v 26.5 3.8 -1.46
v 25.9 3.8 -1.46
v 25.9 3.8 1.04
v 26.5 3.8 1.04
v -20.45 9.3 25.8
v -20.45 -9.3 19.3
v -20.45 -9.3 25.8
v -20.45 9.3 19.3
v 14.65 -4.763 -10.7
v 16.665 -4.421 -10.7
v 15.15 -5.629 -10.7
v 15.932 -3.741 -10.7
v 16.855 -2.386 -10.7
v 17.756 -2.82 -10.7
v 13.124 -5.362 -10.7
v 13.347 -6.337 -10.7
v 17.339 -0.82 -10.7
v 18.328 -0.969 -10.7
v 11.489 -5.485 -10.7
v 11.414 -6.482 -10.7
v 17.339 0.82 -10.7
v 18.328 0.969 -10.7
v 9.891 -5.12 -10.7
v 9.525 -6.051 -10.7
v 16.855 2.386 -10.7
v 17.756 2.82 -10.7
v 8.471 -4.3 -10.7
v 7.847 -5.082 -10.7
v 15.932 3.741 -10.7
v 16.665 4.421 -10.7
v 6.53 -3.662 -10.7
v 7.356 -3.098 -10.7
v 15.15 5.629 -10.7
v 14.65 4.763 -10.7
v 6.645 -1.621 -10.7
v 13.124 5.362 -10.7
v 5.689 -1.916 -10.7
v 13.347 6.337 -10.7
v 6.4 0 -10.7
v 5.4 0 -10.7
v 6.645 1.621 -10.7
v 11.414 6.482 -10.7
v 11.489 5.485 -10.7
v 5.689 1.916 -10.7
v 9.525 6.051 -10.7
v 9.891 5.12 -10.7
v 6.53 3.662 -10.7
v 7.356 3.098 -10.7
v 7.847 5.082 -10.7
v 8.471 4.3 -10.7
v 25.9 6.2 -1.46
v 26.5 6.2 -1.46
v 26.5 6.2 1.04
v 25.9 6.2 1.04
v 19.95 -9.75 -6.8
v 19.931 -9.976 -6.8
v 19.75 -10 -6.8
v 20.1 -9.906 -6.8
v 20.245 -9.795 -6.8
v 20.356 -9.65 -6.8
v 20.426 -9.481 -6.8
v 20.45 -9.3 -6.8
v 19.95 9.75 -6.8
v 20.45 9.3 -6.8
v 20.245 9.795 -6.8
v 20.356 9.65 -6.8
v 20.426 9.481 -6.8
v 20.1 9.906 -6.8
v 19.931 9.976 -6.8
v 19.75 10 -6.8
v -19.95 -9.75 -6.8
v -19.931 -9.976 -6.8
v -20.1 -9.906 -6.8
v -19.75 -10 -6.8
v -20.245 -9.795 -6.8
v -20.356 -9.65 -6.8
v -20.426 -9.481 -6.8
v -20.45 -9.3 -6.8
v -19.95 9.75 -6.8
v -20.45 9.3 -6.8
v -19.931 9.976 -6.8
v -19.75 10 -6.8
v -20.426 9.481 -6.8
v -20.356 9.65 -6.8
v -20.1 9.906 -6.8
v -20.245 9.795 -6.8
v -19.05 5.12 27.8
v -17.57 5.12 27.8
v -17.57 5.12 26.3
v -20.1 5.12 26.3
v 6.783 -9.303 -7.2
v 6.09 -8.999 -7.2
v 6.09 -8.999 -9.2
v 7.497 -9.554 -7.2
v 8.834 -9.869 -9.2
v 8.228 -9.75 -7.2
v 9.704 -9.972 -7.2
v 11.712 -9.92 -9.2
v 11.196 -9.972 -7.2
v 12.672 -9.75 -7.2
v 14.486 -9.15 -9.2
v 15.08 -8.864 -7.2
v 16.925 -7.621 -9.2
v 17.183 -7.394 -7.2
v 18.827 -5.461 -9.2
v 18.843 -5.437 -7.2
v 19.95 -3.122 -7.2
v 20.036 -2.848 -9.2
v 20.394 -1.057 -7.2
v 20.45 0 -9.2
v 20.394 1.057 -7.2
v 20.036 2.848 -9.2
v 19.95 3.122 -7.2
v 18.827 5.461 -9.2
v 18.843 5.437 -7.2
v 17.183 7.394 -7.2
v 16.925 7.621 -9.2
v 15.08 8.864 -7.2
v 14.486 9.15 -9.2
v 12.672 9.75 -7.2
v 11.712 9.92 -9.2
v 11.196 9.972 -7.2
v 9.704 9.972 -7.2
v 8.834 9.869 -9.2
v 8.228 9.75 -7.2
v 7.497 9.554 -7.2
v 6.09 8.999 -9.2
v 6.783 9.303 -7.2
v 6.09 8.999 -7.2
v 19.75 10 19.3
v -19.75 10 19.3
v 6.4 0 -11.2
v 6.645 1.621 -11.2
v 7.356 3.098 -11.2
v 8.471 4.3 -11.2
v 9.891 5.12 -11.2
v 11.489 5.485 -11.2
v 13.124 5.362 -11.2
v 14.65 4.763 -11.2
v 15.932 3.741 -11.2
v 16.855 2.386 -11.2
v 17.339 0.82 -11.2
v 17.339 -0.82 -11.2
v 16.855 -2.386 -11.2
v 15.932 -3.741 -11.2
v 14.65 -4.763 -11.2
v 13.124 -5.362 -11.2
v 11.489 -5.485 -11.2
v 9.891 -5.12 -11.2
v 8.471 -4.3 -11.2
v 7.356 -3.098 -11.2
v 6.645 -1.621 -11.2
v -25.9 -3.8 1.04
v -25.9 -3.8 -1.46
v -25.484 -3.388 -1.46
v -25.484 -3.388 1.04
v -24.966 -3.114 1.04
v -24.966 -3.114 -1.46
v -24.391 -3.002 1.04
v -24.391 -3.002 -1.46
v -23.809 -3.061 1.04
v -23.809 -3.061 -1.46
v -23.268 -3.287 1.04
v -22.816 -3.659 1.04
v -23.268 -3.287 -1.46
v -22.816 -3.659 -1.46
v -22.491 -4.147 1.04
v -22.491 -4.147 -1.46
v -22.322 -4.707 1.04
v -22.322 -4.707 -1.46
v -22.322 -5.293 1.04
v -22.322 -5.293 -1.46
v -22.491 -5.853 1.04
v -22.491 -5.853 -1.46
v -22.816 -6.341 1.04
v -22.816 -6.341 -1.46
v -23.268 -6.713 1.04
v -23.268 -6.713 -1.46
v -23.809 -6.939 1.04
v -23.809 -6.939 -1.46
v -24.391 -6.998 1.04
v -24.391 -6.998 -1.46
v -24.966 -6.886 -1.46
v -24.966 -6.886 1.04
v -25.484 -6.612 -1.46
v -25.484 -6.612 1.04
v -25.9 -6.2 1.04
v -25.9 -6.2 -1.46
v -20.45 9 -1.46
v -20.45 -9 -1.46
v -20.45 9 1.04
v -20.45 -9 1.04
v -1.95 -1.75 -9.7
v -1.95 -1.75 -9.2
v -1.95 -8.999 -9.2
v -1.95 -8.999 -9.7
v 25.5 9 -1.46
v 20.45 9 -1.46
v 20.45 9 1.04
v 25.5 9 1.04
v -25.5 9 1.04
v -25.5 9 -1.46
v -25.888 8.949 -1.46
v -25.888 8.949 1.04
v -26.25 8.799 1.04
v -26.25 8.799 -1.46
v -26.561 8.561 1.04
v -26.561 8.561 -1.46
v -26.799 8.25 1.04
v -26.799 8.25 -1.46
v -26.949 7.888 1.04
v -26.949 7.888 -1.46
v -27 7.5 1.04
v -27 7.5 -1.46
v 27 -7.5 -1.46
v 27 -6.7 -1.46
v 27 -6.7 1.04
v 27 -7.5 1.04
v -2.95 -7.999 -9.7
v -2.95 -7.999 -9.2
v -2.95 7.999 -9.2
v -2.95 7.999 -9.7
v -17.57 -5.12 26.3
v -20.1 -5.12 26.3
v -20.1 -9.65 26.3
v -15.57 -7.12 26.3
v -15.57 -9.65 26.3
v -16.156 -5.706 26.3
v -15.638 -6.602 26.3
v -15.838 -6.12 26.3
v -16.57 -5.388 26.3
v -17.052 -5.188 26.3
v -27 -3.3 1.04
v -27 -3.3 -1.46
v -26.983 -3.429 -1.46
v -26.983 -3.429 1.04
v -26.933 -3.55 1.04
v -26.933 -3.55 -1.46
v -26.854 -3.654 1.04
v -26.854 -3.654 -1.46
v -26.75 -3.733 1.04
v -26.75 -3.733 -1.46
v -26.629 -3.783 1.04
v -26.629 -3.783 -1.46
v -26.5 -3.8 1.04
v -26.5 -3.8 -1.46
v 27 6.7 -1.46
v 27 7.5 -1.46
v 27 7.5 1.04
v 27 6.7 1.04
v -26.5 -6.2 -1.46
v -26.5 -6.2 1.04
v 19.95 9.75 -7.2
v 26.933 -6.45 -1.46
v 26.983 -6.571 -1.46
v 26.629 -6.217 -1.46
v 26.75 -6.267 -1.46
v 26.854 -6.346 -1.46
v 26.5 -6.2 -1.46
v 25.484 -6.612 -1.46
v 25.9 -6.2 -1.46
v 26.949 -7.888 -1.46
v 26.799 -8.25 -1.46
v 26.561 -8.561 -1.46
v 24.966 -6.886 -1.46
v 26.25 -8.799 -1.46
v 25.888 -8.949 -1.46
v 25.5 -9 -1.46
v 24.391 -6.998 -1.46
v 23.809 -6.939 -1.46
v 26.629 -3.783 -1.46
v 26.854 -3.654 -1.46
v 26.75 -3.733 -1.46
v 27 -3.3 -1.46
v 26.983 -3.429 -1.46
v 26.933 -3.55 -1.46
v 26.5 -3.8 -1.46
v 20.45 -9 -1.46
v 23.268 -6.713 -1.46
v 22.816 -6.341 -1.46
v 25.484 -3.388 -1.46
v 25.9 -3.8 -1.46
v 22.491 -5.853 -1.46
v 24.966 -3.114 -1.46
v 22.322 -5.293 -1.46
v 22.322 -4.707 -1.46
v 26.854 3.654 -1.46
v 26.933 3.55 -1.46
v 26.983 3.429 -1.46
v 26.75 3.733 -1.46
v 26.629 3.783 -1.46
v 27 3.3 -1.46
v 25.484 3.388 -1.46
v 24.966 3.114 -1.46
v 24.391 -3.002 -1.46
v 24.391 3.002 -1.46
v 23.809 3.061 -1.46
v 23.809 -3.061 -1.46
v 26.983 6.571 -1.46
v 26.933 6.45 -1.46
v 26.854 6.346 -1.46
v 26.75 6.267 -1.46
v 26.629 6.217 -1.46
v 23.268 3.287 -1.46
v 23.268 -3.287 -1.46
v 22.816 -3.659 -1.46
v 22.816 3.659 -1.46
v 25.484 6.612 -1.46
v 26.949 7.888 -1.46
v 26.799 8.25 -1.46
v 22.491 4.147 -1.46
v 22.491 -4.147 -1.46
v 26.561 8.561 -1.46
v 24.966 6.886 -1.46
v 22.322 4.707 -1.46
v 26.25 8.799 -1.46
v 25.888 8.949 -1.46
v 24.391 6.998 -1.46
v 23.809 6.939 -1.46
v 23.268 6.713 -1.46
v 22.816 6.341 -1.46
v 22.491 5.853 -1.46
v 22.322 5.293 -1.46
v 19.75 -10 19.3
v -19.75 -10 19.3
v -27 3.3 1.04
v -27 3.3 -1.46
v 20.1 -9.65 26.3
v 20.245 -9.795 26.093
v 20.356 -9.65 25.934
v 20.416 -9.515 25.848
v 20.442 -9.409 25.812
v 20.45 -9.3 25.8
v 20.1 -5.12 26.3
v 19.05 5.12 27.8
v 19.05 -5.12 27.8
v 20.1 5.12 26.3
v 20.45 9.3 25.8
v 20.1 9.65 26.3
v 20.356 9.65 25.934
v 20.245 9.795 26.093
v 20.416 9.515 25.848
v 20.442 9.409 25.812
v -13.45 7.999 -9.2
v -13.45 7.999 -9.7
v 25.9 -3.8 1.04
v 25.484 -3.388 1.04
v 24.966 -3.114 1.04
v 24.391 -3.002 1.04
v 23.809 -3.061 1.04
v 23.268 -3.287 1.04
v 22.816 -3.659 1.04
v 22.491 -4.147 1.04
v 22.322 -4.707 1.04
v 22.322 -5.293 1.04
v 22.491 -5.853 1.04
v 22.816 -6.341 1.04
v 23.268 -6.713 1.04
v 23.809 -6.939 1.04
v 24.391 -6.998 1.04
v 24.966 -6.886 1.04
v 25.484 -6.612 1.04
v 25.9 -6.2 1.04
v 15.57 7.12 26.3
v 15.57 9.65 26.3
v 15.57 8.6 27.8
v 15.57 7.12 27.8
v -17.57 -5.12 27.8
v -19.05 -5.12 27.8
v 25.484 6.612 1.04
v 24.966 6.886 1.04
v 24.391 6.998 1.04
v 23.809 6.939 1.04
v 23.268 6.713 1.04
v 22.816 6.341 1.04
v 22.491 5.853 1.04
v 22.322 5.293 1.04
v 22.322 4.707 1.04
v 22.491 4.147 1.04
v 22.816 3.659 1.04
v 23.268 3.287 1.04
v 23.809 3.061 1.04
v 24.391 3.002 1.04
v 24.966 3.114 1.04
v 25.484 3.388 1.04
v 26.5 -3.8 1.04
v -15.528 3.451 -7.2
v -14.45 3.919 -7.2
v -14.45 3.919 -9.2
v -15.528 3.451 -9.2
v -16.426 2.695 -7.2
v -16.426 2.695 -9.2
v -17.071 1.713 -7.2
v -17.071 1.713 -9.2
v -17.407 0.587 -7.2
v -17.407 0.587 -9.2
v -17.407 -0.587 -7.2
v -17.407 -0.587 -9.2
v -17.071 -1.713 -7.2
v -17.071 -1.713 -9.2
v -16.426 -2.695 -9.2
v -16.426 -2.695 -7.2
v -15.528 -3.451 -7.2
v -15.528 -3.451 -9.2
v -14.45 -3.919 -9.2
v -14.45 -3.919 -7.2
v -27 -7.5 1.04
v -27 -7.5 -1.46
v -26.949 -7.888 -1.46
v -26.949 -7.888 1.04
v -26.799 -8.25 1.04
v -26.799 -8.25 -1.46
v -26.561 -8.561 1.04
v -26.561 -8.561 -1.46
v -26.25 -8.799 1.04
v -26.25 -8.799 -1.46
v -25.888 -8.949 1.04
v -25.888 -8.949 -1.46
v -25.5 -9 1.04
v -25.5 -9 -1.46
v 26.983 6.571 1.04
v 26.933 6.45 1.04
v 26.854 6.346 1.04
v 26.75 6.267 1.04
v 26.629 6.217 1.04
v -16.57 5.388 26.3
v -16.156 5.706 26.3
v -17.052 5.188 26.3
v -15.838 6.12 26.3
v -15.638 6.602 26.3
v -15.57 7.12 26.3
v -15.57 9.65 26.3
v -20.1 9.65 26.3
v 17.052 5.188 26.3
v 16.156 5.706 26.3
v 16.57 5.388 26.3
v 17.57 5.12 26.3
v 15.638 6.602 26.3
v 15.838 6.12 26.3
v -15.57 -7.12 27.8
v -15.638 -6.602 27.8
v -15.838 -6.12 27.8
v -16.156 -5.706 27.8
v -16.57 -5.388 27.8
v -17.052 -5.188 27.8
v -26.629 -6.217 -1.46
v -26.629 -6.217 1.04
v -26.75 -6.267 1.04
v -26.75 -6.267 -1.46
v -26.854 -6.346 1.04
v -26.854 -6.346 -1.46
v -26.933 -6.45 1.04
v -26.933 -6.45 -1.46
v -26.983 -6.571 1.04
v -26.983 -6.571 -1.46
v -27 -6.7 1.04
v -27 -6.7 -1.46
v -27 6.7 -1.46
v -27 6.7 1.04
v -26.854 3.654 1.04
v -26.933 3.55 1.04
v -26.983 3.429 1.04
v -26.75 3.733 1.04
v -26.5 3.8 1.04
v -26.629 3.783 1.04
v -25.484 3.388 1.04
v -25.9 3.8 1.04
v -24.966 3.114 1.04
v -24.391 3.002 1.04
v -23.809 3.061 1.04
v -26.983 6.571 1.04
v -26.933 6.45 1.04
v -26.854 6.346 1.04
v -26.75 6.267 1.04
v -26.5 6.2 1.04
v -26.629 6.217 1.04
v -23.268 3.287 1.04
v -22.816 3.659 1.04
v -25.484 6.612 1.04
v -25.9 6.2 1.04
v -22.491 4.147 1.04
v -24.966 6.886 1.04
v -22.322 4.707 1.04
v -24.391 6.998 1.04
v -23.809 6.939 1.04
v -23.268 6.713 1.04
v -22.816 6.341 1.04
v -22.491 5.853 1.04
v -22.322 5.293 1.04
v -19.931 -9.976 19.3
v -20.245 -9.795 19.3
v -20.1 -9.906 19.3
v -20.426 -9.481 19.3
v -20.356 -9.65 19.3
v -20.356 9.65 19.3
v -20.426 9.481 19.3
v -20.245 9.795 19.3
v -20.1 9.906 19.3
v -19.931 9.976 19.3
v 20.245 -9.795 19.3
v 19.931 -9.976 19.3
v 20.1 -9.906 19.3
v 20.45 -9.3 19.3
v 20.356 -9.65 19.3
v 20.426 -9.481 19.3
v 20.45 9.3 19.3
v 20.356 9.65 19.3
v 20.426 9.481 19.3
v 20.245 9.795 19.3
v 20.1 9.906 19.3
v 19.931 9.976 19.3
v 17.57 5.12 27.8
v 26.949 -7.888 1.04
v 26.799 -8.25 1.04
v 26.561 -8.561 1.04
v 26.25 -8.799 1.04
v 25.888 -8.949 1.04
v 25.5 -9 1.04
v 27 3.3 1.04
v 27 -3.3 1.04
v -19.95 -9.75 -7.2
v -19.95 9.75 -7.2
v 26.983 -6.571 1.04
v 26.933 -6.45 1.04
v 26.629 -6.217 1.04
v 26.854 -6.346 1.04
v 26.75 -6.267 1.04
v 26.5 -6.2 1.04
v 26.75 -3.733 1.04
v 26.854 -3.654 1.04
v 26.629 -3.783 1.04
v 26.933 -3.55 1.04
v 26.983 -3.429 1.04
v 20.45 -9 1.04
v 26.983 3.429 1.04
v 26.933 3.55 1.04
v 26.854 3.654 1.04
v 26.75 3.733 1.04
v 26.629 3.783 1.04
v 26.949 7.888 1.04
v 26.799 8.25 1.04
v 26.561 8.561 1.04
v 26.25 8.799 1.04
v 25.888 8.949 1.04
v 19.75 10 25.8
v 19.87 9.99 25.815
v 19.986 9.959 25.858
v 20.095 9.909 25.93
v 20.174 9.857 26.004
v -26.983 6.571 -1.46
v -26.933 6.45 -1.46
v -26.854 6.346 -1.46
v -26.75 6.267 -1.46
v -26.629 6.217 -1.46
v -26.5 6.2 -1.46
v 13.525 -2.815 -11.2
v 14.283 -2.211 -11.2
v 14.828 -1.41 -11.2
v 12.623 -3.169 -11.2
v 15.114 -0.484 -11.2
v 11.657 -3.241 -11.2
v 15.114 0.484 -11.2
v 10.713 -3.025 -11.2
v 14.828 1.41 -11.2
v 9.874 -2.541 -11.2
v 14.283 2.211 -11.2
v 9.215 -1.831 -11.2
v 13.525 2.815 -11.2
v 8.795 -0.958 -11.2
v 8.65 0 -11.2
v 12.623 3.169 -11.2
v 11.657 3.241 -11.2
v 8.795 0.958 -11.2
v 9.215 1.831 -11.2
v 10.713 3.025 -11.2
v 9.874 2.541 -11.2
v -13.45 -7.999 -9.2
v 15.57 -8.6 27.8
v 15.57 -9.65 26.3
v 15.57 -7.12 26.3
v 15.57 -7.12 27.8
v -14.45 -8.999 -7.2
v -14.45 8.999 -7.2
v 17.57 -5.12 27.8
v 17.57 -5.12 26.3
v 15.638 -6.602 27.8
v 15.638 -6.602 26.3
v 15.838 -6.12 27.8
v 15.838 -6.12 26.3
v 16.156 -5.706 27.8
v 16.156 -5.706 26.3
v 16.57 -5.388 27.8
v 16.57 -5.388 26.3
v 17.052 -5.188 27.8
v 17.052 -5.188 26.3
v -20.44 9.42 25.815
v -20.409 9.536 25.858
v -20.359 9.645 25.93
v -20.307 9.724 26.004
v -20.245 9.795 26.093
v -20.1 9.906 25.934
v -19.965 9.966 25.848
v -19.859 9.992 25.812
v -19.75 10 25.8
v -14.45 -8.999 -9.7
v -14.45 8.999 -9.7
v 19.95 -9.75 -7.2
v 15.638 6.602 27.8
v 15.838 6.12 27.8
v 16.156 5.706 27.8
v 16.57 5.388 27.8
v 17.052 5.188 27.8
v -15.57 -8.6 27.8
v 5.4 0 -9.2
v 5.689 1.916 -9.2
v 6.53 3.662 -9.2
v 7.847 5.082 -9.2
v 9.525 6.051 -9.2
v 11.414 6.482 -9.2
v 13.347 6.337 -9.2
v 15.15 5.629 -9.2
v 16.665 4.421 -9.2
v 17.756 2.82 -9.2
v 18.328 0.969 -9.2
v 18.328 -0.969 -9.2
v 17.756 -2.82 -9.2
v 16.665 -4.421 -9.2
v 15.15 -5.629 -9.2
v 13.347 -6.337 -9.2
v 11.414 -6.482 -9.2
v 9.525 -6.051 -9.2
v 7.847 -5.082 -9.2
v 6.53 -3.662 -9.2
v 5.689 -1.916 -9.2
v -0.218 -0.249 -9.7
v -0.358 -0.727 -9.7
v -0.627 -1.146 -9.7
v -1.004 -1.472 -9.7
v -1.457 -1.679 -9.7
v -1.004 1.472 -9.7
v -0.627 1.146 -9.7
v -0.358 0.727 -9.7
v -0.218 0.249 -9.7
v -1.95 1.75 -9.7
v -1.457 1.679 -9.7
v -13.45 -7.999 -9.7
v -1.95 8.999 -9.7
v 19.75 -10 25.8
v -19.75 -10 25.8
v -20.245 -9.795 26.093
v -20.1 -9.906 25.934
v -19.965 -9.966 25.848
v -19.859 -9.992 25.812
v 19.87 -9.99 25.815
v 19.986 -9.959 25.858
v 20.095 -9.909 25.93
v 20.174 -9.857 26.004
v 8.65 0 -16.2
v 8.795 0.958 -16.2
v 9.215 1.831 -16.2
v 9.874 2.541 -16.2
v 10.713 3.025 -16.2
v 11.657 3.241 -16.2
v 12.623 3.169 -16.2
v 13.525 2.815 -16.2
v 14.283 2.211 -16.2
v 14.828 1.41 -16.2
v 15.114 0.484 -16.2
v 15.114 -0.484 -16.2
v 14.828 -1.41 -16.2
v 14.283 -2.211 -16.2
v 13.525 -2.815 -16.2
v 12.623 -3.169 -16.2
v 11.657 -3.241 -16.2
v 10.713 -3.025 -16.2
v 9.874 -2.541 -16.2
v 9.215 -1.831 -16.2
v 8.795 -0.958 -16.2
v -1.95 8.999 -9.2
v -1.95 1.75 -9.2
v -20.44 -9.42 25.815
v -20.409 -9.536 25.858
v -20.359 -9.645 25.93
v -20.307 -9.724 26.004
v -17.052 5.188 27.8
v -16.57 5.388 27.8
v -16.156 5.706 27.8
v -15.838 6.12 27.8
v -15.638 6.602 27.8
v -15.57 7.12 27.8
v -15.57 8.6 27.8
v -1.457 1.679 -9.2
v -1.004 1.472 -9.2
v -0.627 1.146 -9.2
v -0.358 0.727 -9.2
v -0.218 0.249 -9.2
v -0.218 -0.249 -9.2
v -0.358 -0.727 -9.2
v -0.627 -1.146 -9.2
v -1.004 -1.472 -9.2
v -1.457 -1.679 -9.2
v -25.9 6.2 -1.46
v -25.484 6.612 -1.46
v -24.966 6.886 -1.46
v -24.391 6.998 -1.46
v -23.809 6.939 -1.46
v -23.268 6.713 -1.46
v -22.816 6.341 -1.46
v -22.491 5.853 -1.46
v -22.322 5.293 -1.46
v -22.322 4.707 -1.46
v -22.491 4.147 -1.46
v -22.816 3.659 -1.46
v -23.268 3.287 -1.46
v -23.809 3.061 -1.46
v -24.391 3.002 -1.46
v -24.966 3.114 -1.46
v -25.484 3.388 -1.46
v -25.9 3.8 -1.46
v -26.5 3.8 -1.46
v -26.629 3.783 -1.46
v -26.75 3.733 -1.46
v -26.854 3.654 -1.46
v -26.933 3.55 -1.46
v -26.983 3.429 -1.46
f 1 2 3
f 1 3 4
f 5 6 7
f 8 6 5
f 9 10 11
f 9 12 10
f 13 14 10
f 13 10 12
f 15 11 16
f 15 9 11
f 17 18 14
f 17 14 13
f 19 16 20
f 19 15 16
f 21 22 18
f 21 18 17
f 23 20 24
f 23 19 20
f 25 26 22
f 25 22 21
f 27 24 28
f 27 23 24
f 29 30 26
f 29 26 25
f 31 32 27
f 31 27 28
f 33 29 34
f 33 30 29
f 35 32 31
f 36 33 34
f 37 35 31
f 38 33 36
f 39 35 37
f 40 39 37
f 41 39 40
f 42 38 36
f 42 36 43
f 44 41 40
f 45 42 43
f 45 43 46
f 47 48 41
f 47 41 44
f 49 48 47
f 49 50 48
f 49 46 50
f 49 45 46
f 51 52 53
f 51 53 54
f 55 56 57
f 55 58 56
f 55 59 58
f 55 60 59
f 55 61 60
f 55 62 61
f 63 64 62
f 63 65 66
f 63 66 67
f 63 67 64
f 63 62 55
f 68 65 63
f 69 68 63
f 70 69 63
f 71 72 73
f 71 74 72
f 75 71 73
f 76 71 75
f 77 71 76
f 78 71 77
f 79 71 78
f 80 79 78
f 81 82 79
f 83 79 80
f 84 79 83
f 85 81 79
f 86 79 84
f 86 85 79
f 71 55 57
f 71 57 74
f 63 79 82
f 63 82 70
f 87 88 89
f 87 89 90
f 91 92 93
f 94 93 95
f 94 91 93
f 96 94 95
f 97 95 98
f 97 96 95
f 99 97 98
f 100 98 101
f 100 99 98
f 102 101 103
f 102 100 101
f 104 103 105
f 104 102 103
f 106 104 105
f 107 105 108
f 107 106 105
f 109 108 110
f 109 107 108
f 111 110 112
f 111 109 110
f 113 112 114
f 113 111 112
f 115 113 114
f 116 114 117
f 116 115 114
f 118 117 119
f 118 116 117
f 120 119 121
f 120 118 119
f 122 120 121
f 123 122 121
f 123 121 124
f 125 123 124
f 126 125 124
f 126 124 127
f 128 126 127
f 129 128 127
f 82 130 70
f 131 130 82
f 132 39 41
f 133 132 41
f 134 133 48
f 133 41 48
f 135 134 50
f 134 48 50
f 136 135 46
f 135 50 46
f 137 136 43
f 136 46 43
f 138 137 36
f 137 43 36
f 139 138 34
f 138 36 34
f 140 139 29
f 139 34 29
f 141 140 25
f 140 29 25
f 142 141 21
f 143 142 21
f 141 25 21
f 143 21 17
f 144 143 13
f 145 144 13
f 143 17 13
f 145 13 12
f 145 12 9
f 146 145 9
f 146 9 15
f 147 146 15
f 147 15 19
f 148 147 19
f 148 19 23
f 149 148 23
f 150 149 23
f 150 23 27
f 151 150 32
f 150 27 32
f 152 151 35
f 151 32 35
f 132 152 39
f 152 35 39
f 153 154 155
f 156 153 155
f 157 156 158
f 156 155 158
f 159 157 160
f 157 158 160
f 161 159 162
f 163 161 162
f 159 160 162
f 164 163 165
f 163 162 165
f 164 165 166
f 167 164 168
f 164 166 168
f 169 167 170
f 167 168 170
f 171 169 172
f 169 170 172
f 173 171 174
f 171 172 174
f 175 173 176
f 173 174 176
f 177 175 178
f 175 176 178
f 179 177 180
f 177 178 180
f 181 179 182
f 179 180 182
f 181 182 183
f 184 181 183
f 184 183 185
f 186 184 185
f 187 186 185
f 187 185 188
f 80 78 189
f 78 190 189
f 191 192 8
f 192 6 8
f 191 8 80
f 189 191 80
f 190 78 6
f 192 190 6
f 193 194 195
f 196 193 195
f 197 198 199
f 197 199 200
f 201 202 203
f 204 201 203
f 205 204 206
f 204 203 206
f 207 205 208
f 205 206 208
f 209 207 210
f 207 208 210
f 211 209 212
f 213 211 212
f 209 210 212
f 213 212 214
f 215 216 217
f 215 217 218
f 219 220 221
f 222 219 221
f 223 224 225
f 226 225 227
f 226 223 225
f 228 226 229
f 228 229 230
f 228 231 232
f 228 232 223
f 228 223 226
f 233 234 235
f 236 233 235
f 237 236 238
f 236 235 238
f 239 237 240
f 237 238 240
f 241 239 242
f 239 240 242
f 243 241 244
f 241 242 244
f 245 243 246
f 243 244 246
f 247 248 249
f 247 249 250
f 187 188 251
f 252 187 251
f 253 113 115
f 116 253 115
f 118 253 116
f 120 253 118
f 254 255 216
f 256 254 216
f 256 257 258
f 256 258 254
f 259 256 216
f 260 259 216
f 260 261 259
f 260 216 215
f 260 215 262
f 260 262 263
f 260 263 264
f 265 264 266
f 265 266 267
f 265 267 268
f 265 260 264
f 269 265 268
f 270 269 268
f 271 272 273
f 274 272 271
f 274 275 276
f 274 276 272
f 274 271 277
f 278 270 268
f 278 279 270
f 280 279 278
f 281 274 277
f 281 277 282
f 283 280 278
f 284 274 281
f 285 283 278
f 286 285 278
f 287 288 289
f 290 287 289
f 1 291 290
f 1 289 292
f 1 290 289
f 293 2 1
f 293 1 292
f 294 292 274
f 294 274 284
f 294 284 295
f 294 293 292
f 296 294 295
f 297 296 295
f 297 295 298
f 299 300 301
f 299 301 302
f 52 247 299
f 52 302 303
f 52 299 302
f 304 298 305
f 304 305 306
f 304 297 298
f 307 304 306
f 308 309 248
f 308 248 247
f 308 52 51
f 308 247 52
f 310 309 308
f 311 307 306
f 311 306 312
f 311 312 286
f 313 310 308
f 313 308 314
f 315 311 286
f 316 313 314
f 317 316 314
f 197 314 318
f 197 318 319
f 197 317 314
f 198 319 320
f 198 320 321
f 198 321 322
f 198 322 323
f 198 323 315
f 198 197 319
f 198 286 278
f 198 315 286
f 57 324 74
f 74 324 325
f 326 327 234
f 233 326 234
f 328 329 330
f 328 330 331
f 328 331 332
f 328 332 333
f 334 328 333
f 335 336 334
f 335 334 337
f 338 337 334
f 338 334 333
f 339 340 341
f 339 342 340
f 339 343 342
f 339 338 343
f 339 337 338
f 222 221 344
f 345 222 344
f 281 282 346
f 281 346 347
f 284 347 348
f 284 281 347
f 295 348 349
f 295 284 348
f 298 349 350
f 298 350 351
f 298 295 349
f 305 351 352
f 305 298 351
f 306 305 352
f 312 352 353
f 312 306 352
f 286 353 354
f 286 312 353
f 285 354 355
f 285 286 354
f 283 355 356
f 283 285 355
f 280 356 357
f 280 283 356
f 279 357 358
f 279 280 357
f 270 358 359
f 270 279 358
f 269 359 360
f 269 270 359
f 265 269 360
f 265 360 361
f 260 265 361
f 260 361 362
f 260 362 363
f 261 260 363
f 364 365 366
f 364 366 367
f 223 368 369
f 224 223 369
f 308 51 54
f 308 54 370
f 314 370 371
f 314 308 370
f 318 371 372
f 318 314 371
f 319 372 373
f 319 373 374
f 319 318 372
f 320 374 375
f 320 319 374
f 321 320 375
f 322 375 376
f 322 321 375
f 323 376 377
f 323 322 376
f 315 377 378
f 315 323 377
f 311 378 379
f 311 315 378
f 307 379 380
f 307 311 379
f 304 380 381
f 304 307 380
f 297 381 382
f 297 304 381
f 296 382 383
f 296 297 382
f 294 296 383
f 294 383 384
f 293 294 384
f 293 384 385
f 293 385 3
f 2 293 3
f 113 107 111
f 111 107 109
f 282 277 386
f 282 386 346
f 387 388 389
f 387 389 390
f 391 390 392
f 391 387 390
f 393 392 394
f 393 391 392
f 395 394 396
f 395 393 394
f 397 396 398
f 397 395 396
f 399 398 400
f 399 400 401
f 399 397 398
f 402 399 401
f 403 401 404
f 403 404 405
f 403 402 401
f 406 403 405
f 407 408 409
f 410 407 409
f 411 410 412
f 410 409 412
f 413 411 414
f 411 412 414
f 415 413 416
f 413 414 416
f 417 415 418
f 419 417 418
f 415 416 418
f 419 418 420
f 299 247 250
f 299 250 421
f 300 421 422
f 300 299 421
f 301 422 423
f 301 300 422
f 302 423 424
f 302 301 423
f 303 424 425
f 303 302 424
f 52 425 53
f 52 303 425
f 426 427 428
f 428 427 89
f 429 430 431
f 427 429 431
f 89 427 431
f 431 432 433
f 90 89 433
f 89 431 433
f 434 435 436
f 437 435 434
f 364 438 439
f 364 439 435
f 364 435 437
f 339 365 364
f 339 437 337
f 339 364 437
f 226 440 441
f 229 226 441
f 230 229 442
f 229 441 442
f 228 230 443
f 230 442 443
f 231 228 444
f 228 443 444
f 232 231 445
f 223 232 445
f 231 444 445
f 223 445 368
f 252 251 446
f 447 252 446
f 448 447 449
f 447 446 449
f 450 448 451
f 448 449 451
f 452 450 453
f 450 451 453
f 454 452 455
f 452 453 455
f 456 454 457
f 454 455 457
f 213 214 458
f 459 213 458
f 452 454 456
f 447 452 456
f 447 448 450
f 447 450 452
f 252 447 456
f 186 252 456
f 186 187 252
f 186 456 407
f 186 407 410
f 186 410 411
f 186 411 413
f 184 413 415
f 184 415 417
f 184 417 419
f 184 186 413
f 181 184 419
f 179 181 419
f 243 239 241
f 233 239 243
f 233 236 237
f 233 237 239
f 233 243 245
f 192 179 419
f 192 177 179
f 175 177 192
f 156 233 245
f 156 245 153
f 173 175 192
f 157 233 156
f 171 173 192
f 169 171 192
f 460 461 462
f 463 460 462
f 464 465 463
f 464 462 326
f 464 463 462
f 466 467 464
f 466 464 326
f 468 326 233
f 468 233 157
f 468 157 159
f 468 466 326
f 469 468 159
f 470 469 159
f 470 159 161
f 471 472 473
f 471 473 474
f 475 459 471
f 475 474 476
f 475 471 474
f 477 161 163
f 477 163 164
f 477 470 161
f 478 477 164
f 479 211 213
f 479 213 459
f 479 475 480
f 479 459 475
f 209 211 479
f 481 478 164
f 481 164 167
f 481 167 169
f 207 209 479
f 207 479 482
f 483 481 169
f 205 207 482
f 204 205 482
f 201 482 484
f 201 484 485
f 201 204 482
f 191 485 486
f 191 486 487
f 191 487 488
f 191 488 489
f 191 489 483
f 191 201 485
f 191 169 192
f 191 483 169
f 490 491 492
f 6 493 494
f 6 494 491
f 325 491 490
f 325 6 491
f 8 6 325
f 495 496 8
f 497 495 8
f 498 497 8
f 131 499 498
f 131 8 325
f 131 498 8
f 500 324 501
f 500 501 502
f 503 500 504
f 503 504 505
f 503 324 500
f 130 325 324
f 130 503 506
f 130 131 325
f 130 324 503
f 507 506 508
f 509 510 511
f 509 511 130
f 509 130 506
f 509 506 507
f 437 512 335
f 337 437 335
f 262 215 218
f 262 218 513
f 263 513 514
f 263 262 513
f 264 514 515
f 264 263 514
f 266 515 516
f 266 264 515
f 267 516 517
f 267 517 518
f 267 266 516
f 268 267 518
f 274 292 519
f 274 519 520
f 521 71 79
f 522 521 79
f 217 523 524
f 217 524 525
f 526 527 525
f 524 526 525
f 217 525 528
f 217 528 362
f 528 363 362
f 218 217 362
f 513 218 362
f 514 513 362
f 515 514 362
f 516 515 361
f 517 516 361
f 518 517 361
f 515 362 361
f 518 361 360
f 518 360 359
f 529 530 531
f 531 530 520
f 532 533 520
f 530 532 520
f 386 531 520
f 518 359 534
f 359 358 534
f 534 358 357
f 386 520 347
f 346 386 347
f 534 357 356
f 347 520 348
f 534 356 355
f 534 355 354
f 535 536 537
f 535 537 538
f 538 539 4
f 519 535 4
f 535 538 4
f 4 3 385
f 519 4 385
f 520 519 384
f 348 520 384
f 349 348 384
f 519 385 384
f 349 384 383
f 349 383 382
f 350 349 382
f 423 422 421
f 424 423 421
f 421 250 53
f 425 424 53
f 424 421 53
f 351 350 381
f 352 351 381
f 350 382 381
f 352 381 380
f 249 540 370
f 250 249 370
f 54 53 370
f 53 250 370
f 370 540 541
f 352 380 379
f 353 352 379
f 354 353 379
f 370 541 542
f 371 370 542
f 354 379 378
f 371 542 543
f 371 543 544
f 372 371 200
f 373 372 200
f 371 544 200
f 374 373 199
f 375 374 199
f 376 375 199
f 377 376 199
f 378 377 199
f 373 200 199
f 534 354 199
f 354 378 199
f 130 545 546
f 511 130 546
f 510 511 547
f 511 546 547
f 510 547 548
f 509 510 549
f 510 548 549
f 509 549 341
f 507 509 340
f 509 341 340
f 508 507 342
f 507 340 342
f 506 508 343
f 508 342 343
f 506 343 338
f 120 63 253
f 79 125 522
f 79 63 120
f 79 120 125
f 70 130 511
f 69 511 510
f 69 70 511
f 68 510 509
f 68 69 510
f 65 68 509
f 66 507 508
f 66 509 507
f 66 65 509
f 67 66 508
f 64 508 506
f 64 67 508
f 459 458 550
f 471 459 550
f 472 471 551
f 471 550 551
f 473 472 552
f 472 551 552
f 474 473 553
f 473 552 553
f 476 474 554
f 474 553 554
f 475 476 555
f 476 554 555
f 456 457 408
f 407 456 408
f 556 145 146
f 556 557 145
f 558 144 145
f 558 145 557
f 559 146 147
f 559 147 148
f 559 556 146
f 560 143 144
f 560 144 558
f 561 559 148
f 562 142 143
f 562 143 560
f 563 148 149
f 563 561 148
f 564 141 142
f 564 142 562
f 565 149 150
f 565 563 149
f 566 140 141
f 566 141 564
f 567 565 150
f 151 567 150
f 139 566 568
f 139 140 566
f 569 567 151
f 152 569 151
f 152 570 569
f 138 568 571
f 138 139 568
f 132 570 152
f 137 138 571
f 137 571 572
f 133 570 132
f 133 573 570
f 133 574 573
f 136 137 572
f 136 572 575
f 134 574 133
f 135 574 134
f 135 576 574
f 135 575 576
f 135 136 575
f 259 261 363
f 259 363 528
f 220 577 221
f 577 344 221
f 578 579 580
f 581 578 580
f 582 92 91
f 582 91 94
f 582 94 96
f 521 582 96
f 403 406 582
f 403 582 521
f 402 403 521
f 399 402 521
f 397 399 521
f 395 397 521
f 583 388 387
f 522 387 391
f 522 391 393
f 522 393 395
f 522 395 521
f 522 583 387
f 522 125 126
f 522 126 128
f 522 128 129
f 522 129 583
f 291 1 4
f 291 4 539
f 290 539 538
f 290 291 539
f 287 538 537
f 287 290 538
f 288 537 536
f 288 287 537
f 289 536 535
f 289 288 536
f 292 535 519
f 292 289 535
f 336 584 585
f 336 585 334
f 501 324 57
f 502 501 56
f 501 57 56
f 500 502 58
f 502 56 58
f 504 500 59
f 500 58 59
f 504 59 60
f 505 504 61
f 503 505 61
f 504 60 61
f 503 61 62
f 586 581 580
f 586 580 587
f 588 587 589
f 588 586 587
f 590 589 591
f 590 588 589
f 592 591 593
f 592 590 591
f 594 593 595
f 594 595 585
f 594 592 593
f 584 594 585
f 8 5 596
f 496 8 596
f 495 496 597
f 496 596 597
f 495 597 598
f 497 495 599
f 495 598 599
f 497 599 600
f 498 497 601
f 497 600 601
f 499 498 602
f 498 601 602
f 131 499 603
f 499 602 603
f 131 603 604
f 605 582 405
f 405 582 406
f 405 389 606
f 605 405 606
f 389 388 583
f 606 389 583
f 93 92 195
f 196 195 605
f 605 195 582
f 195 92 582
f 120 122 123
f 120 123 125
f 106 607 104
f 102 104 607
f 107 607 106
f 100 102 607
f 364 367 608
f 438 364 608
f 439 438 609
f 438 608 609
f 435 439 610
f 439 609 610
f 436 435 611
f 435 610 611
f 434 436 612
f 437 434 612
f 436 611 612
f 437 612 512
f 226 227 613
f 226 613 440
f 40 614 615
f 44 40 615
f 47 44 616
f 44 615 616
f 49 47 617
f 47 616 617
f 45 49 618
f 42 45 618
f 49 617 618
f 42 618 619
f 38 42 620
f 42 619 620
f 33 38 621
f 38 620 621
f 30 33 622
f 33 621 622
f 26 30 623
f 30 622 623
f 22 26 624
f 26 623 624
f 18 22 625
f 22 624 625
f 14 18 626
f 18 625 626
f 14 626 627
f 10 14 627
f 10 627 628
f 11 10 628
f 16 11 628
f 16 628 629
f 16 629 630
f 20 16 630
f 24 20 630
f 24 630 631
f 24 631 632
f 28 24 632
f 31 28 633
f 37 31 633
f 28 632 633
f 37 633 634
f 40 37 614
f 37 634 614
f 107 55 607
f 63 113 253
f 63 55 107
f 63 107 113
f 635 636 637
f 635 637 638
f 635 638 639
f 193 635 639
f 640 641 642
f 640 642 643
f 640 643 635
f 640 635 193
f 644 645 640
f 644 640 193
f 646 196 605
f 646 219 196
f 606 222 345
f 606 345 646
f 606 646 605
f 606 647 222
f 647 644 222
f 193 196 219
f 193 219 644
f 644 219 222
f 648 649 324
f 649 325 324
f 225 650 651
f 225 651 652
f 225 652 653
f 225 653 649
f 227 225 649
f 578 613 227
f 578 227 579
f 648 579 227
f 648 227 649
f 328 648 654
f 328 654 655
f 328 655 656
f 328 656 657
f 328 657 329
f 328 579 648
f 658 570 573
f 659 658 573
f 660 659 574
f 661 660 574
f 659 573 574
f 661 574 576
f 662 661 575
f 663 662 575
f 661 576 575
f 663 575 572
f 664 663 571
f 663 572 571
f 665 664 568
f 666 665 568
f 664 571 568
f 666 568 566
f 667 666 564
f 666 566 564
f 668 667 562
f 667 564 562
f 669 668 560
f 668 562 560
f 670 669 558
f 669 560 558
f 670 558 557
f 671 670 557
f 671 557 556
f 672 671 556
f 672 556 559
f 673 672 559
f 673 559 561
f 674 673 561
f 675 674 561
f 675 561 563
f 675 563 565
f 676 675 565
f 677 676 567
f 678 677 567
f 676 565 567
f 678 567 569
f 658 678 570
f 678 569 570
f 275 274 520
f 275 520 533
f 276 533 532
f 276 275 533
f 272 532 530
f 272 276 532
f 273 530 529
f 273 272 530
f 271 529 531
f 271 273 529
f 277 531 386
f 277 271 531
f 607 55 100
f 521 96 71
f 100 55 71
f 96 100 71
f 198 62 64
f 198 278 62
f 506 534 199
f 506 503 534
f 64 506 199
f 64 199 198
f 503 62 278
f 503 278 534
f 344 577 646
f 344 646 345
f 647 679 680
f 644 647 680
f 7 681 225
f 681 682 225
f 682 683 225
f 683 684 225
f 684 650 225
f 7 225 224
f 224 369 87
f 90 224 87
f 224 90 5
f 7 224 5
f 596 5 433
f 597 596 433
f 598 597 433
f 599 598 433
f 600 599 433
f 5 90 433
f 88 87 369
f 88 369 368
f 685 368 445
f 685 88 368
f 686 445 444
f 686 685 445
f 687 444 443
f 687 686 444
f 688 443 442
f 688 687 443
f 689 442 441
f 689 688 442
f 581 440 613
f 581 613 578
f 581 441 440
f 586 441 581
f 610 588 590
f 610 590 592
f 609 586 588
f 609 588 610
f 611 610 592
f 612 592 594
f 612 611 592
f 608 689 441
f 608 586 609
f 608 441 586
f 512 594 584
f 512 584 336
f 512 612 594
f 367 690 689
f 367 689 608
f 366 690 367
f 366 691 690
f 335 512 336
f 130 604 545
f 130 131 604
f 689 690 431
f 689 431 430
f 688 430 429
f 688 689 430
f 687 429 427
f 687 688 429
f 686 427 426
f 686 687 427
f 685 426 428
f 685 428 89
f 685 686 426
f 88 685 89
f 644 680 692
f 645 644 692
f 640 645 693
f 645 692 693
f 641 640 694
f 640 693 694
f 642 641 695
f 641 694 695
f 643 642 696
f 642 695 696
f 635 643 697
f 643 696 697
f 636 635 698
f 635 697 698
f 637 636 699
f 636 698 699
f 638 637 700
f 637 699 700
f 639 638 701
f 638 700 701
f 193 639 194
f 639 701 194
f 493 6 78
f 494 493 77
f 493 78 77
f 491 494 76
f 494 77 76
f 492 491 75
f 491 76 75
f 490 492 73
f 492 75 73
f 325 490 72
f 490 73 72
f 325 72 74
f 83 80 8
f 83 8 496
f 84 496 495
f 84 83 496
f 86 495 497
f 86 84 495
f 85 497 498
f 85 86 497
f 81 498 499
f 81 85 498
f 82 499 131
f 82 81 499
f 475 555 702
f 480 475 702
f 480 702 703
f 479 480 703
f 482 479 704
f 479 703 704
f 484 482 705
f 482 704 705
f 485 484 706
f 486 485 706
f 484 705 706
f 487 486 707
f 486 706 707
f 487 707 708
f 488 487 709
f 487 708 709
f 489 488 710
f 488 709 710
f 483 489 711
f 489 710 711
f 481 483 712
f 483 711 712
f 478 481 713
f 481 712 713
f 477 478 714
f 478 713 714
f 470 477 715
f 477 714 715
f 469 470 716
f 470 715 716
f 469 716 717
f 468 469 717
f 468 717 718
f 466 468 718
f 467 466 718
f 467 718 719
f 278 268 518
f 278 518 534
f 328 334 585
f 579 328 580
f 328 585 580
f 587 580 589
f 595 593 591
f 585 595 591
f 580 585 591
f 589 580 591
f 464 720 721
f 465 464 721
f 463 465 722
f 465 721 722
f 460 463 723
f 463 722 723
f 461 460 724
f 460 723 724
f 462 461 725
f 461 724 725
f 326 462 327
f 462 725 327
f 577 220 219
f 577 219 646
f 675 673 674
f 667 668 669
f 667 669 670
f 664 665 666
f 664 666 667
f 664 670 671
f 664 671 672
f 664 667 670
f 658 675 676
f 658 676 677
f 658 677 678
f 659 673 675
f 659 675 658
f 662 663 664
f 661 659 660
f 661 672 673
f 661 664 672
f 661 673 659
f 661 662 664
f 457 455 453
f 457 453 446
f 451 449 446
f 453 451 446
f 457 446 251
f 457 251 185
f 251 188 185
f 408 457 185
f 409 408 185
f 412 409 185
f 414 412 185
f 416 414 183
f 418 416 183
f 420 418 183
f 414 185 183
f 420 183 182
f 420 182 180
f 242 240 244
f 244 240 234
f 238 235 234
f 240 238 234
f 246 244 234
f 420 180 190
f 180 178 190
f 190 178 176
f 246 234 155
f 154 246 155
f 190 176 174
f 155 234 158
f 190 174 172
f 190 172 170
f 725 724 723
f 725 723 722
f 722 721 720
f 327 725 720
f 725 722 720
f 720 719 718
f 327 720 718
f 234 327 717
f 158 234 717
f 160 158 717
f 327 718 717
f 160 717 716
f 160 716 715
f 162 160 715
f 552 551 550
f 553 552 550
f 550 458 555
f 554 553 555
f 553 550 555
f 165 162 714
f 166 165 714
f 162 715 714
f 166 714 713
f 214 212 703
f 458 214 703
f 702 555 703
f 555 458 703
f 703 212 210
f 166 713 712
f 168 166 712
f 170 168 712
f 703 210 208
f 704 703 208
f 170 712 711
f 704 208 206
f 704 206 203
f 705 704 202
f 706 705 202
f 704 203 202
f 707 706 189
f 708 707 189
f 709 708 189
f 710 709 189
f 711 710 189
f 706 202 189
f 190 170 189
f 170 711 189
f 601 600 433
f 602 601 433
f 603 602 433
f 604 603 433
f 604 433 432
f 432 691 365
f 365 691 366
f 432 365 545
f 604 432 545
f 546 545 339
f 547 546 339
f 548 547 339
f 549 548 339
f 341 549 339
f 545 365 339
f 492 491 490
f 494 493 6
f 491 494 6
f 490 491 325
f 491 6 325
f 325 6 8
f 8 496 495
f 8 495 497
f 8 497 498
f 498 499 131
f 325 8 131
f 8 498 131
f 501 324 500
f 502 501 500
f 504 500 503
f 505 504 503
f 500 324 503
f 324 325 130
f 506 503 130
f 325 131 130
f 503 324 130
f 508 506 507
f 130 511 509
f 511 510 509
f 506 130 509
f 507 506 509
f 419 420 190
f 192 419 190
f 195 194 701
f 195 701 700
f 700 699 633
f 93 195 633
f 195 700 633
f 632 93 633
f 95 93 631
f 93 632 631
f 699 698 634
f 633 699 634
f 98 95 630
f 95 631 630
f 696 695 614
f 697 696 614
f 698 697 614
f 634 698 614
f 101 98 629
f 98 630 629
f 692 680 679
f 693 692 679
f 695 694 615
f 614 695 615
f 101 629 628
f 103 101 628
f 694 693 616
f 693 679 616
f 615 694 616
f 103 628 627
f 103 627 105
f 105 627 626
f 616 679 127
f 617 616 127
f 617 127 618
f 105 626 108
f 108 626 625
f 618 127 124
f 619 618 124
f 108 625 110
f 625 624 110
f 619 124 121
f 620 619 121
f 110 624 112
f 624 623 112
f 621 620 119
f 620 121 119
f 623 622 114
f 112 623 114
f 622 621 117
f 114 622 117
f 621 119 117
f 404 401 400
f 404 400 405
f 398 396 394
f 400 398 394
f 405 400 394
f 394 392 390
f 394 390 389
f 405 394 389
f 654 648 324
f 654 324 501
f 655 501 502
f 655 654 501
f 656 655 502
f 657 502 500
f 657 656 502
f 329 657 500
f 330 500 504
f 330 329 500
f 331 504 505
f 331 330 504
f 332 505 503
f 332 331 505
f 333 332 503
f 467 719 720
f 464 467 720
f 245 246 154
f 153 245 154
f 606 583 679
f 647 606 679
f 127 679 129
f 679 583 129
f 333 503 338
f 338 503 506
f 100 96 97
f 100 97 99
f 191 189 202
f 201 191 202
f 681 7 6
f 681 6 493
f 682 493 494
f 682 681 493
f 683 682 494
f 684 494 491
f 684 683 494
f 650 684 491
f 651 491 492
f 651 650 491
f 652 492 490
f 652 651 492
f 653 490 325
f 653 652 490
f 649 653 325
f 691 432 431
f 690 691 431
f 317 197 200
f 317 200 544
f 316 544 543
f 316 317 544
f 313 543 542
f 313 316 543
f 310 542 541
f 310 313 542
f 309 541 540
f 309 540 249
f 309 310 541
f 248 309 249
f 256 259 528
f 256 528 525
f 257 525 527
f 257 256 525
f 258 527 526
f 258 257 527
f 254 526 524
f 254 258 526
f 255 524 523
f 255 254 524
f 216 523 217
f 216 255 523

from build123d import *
from OCP.BRepFilletAPI import BRepFilletAPI_MakeChamfer

# Parameters (mm, degrees)
SKETCH1_W            = 40.9
SKETCH1_H            = 20
BOSS_EXTRUDE1_DEPTH  = 19.3
SKETCH2_W            = 40.9
SKETCH2_H            = 20
BOSS_EXTRUDE2_DEPTH  = 6.8
SKETCH3_W            = 40.9
SKETCH3_H            = 20
BOSS_EXTRUDE3_DEPTH  = 8.5
CHAMFER1_SIZE        = 2
CHAMFER1_SIZE2       = 1.400415076
CUT_EXTRUDE1_DEPTH   = 1.5
SKETCH5_W            = 39.9
SKETCH5_H            = 19.5
BOSS_EXTRUDE4_DEPTH  = 0.4
BOSS_EXTRUDE5_DEPTH  = 2
SKETCH8_R            = 6.5
BOSS_EXTRUDE6_DEPTH  = 1.5
SKETCH9_R            = 5.5
BOSS_EXTRUDE7_DEPTH  = 0.5
SKETCH10_R           = 3.25
BOSS_EXTRUDE8_DEPTH  = 5
SKETCH11_W           = 10.5
SKETCH11_H           = 15.998933302
BOSS_EXTRUDE9_DEPTH  = 0.5
FILLET1_R            = 0.7
FILLET2_R            = 0.7
FILLET3_R            = 0.7
BOSS_EXTRUDE10_START = -5.74
BOSS_EXTRUDE10_DEPTH = 2.5


with BuildPart() as part:
    # Sketch1 → Boss-Extrude1 (new body)
    with BuildSketch(Plane.XY):
        Rectangle(SKETCH1_W, SKETCH1_H)
    extrude(amount=BOSS_EXTRUDE1_DEPTH)

    # Fillet1
    fillet1_edges = [part.edges().sort_by_distance(p)[0] for p in [
        (-20.45, 10, 9.65),
        (20.45, 10, 9.65),
        (20.45, -10, 9.65),
        (-20.45, -10, 9.65),
    ]]
    fillet(fillet1_edges, radius=FILLET1_R)



with BuildPart() as body_2:
    # Sketch2 → Boss-Extrude2 (new body)
    with BuildSketch(Plane(origin=(0, 0, 0), x_dir=(-1, 0, 0), z_dir=(0, 0, -1))):
        Rectangle(SKETCH2_W, SKETCH2_H)
    extrude(amount=BOSS_EXTRUDE2_DEPTH)

    # Sketch5 → Boss-Extrude4 (add)
    with BuildSketch(Plane(origin=(0, 0, -6.8), x_dir=(-1, 0, 0), z_dir=(0, 0, -1))):
        Rectangle(SKETCH5_W, SKETCH5_H)
    extrude(amount=BOSS_EXTRUDE4_DEPTH)

    # Sketch7 → Boss-Extrude5 (add)
    with BuildSketch(Plane(origin=(0, 0, -7.2), x_dir=(-1, 0, 0), z_dir=(0, 0, -1))):
        with BuildLine():
            Line((-6.09, 8.999466651), (14.45, 8.999466651))
            Line((14.45, 8.999466651), (14.45, 3.918790103))
            ThreePointArc((14.45, 3.918790103), (17.45, 0), (14.45, -3.918790103))
            Line((14.45, -3.918790103), (14.45, -8.999466651))
            Line((14.45, -8.999466651), (-6.09, -8.999466651))
            ThreePointArc((-6.09, -8.999466651), (-20.45, 0), (-6.09, 8.999466651))
        make_face()
    extrude(amount=BOSS_EXTRUDE5_DEPTH)

    # Sketch8 → Boss-Extrude6 (add)
    with BuildSketch(Plane(origin=(0, 0, -9.2), x_dir=(-1, 0, 0), z_dir=(0, 0, -1))):
        with Locations((-11.900165179, 0)):
            Circle(SKETCH8_R)
    extrude(amount=BOSS_EXTRUDE6_DEPTH)

    # Sketch9 → Boss-Extrude7 (add)
    with BuildSketch(Plane(origin=(0, 0, -10.7), x_dir=(-1, 0, 0), z_dir=(0, 0, -1))):
        with Locations((-11.900165179, 0)):
            Circle(SKETCH9_R)
    extrude(amount=BOSS_EXTRUDE7_DEPTH)

    # Sketch10 → Boss-Extrude8 (add)
    with BuildSketch(Plane(origin=(0, 0, -11.2), x_dir=(-1, 0, 0), z_dir=(0, 0, -1))):
        with Locations((-11.900165179, 0)):
            Circle(SKETCH10_R)
    extrude(amount=BOSS_EXTRUDE8_DEPTH)

    # Sketch11 → Boss-Extrude9 (add)
    with BuildSketch(Plane(origin=(0, 0, -9.2), x_dir=(-1, 0, 0), z_dir=(0, 0, -1))):
        with BuildLine():
            Line((14.45, 8.999466651), (1.95, 8.999466651))
            Line((1.95, 8.999466651), (1.95, 1.75))
            ThreePointArc((1.95, 1.75), (0.2, 0), (1.95, -1.75))
            Line((1.95, -1.75), (1.95, -8.999466651))
            Line((1.95, -8.999466651), (14.45, -8.999466651))
            Line((14.45, -8.999466651), (14.45, 8.999466651))
        make_face()
        with Locations((8.2, 0)):
            Rectangle(SKETCH11_W, SKETCH11_H, mode=Mode.SUBTRACT)
    extrude(amount=BOSS_EXTRUDE9_DEPTH)

    # Fillet2
    fillet2_edges = [body_2.edges().sort_by_distance(p)[0] for p in [
        (20.45, -10, -3.4),
        (20.45, 10, -3.4),
        (-20.45, 10, -3.4),
        (-20.45, -10, -3.4),
    ]]
    fillet(fillet2_edges, radius=FILLET2_R)


with BuildPart() as body_3:
    # Sketch3 → Boss-Extrude3 (new body)
    with BuildSketch(Plane.XY.offset(19.3)):
        Rectangle(SKETCH3_W, SKETCH3_H)
    extrude(amount=BOSS_EXTRUDE3_DEPTH)

    # Chamfer1: one chamfer whose edges measure the first distance from different faces: ONE call of the kernel's chamfer builder (chamfer() names one face for all edges)
    chamfer1_edges_1 = [body_3.edges().sort_by_distance(p)[0] for p in [
        (0, -10, 27.8),
    ]]
    chamfer1_side_1 = [body_3.faces().sort_by_distance(p)[0] for p in [
        (0, -10, 23.55),
    ]]
    chamfer1_edges_2 = [body_3.edges().sort_by_distance(p)[0] for p in [
        (20.45, 0, 27.8),
    ]]
    chamfer1_side_2 = [body_3.faces().sort_by_distance(p)[0] for p in [
        (20.45, 0, 23.55),
    ]]
    chamfer1_edges_3 = [body_3.edges().sort_by_distance(p)[0] for p in [
        (0, 10, 27.8),
    ]]
    chamfer1_side_3 = [body_3.faces().sort_by_distance(p)[0] for p in [
        (0, 10, 23.55),
    ]]
    chamfer1_edges_4 = [body_3.edges().sort_by_distance(p)[0] for p in [
        (-20.45, 0, 27.8),
    ]]
    chamfer1_side_4 = [body_3.faces().sort_by_distance(p)[0] for p in [
        (-20.45, 0, 23.55),
    ]]
    chamfer1 = BRepFilletAPI_MakeChamfer(body_3.part.solid().wrapped)
    for e in chamfer1_edges_1:
        chamfer1.Add(CHAMFER1_SIZE, CHAMFER1_SIZE2, e.wrapped, chamfer1_side_1[0].wrapped)  # the first distance lies on this face
    for e in chamfer1_edges_2:
        chamfer1.Add(CHAMFER1_SIZE, CHAMFER1_SIZE2, e.wrapped, chamfer1_side_2[0].wrapped)  # the first distance lies on this face
    for e in chamfer1_edges_3:
        chamfer1.Add(CHAMFER1_SIZE, CHAMFER1_SIZE2, e.wrapped, chamfer1_side_3[0].wrapped)  # the first distance lies on this face
    for e in chamfer1_edges_4:
        chamfer1.Add(CHAMFER1_SIZE, CHAMFER1_SIZE2, e.wrapped, chamfer1_side_4[0].wrapped)  # the first distance lies on this face
    add(Compound.cast(chamfer1.Shape()), mode=Mode.REPLACE)

    # Sketch4 → Cut-Extrude1 (cut)
    with BuildSketch(Plane.XY.offset(27.8)):
        with BuildLine():
            Line((-20.45, 10), (-15.57, 10))
            Line((-15.57, 10), (-15.57, 7.12))
            ThreePointArc((-15.57, 7.12), (-16.155786438, 5.705786438), (-17.57, 5.12))
            Line((-17.57, 5.12), (-20.45, 5.12))
            Line((-20.45, 5.12), (-20.45, 10))
        make_face()
        with BuildLine():
            Line((15.57, 10), (15.57, 7.12))
            ThreePointArc((15.57, 7.12), (16.155786438, 5.705786438), (17.57, 5.12))
            Line((17.57, 5.12), (20.45, 5.12))
            Line((20.45, 5.12), (20.45, 10))
            Line((20.45, 10), (15.57, 10))
        make_face()
        with BuildLine():
            Line((-15.57, -10), (-15.57, -7.12))
            ThreePointArc((-15.57, -7.12), (-16.155786438, -5.705786438), (-17.57, -5.12))
            Line((-17.57, -5.12), (-20.45, -5.12))
            Line((-20.45, -5.12), (-20.45, -10))
            Line((-20.45, -10), (-15.57, -10))
        make_face()
        with BuildLine():
            Line((20.45, -10), (15.57, -10))
            Line((15.57, -10), (15.57, -7.12))
            ThreePointArc((15.57, -7.12), (16.155786438, -5.705786438), (17.57, -5.12))
            Line((17.57, -5.12), (20.45, -5.12))
            Line((20.45, -5.12), (20.45, -10))
        make_face()
    extrude(amount=-CUT_EXTRUDE1_DEPTH, mode=Mode.SUBTRACT)

    # Fillet3
    fillet3_edges = [body_3.edges().sort_by_distance(p)[0] for p in [
        (20.45, 10, 22.55),
        (20.45, -10, 22.55),
        (-20.45, -10, 22.55),
        (-20.45, 10, 22.55),
    ]]
    fillet(fillet3_edges, radius=FILLET3_R)


with BuildPart() as part_1:
    add(part.part)

    add(body_2.part)  # Boss-Extrude10 merges body 2
    # Sketch12 → Boss-Extrude10 (add)
    with BuildSketch(Plane(origin=(0, 0, -7.2), x_dir=(-1, 0, 0), z_dir=(0, 0, -1)).offset(BOSS_EXTRUDE10_START)):
        with BuildLine():
            Line((20.45, 9), (25.5, 9))
            ThreePointArc((25.5, 9), (26.560660172, 8.560660172), (27, 7.5))
            Line((27, 7.5), (27, 6.7))
            ThreePointArc((27, 6.7), (26.853553391, 6.346446609), (26.5, 6.2))
            Line((26.5, 6.2), (25.9, 6.2))
            ThreePointArc((25.9, 6.2), (22.3, 5), (25.9, 3.8))
            Line((25.9, 3.8), (26.5, 3.8))
            ThreePointArc((26.5, 3.8), (26.853553391, 3.653553391), (27, 3.3))
            Line((27, 3.3), (27, -3.3))
            ThreePointArc((27, -3.3), (26.853553391, -3.653553391), (26.5, -3.8))
            Line((26.5, -3.8), (25.9, -3.8))
            ThreePointArc((25.9, -3.8), (22.3, -5), (25.9, -6.2))
            Line((25.9, -6.2), (26.5, -6.2))
            ThreePointArc((26.5, -6.2), (26.853553391, -6.346446609), (27, -6.7))
            Line((27, -6.7), (27, -7.5))
            ThreePointArc((27, -7.5), (26.560660172, -8.560660172), (25.5, -9))
            Line((25.5, -9), (20.45, -9))
            Line((20.45, -9), (20.45, 9))
        make_face()
    boss_extrude10 = extrude(amount=-BOSS_EXTRUDE10_DEPTH)

    # Mirror1: Boss-Extrude10 across plane
    add(boss_extrude10.mirror(Plane(origin=(0, 0, 0), x_dir=(0, 0, 1), z_dir=(1, 0, 0))))


solid = Compound([body_3.part, part_1.part])
